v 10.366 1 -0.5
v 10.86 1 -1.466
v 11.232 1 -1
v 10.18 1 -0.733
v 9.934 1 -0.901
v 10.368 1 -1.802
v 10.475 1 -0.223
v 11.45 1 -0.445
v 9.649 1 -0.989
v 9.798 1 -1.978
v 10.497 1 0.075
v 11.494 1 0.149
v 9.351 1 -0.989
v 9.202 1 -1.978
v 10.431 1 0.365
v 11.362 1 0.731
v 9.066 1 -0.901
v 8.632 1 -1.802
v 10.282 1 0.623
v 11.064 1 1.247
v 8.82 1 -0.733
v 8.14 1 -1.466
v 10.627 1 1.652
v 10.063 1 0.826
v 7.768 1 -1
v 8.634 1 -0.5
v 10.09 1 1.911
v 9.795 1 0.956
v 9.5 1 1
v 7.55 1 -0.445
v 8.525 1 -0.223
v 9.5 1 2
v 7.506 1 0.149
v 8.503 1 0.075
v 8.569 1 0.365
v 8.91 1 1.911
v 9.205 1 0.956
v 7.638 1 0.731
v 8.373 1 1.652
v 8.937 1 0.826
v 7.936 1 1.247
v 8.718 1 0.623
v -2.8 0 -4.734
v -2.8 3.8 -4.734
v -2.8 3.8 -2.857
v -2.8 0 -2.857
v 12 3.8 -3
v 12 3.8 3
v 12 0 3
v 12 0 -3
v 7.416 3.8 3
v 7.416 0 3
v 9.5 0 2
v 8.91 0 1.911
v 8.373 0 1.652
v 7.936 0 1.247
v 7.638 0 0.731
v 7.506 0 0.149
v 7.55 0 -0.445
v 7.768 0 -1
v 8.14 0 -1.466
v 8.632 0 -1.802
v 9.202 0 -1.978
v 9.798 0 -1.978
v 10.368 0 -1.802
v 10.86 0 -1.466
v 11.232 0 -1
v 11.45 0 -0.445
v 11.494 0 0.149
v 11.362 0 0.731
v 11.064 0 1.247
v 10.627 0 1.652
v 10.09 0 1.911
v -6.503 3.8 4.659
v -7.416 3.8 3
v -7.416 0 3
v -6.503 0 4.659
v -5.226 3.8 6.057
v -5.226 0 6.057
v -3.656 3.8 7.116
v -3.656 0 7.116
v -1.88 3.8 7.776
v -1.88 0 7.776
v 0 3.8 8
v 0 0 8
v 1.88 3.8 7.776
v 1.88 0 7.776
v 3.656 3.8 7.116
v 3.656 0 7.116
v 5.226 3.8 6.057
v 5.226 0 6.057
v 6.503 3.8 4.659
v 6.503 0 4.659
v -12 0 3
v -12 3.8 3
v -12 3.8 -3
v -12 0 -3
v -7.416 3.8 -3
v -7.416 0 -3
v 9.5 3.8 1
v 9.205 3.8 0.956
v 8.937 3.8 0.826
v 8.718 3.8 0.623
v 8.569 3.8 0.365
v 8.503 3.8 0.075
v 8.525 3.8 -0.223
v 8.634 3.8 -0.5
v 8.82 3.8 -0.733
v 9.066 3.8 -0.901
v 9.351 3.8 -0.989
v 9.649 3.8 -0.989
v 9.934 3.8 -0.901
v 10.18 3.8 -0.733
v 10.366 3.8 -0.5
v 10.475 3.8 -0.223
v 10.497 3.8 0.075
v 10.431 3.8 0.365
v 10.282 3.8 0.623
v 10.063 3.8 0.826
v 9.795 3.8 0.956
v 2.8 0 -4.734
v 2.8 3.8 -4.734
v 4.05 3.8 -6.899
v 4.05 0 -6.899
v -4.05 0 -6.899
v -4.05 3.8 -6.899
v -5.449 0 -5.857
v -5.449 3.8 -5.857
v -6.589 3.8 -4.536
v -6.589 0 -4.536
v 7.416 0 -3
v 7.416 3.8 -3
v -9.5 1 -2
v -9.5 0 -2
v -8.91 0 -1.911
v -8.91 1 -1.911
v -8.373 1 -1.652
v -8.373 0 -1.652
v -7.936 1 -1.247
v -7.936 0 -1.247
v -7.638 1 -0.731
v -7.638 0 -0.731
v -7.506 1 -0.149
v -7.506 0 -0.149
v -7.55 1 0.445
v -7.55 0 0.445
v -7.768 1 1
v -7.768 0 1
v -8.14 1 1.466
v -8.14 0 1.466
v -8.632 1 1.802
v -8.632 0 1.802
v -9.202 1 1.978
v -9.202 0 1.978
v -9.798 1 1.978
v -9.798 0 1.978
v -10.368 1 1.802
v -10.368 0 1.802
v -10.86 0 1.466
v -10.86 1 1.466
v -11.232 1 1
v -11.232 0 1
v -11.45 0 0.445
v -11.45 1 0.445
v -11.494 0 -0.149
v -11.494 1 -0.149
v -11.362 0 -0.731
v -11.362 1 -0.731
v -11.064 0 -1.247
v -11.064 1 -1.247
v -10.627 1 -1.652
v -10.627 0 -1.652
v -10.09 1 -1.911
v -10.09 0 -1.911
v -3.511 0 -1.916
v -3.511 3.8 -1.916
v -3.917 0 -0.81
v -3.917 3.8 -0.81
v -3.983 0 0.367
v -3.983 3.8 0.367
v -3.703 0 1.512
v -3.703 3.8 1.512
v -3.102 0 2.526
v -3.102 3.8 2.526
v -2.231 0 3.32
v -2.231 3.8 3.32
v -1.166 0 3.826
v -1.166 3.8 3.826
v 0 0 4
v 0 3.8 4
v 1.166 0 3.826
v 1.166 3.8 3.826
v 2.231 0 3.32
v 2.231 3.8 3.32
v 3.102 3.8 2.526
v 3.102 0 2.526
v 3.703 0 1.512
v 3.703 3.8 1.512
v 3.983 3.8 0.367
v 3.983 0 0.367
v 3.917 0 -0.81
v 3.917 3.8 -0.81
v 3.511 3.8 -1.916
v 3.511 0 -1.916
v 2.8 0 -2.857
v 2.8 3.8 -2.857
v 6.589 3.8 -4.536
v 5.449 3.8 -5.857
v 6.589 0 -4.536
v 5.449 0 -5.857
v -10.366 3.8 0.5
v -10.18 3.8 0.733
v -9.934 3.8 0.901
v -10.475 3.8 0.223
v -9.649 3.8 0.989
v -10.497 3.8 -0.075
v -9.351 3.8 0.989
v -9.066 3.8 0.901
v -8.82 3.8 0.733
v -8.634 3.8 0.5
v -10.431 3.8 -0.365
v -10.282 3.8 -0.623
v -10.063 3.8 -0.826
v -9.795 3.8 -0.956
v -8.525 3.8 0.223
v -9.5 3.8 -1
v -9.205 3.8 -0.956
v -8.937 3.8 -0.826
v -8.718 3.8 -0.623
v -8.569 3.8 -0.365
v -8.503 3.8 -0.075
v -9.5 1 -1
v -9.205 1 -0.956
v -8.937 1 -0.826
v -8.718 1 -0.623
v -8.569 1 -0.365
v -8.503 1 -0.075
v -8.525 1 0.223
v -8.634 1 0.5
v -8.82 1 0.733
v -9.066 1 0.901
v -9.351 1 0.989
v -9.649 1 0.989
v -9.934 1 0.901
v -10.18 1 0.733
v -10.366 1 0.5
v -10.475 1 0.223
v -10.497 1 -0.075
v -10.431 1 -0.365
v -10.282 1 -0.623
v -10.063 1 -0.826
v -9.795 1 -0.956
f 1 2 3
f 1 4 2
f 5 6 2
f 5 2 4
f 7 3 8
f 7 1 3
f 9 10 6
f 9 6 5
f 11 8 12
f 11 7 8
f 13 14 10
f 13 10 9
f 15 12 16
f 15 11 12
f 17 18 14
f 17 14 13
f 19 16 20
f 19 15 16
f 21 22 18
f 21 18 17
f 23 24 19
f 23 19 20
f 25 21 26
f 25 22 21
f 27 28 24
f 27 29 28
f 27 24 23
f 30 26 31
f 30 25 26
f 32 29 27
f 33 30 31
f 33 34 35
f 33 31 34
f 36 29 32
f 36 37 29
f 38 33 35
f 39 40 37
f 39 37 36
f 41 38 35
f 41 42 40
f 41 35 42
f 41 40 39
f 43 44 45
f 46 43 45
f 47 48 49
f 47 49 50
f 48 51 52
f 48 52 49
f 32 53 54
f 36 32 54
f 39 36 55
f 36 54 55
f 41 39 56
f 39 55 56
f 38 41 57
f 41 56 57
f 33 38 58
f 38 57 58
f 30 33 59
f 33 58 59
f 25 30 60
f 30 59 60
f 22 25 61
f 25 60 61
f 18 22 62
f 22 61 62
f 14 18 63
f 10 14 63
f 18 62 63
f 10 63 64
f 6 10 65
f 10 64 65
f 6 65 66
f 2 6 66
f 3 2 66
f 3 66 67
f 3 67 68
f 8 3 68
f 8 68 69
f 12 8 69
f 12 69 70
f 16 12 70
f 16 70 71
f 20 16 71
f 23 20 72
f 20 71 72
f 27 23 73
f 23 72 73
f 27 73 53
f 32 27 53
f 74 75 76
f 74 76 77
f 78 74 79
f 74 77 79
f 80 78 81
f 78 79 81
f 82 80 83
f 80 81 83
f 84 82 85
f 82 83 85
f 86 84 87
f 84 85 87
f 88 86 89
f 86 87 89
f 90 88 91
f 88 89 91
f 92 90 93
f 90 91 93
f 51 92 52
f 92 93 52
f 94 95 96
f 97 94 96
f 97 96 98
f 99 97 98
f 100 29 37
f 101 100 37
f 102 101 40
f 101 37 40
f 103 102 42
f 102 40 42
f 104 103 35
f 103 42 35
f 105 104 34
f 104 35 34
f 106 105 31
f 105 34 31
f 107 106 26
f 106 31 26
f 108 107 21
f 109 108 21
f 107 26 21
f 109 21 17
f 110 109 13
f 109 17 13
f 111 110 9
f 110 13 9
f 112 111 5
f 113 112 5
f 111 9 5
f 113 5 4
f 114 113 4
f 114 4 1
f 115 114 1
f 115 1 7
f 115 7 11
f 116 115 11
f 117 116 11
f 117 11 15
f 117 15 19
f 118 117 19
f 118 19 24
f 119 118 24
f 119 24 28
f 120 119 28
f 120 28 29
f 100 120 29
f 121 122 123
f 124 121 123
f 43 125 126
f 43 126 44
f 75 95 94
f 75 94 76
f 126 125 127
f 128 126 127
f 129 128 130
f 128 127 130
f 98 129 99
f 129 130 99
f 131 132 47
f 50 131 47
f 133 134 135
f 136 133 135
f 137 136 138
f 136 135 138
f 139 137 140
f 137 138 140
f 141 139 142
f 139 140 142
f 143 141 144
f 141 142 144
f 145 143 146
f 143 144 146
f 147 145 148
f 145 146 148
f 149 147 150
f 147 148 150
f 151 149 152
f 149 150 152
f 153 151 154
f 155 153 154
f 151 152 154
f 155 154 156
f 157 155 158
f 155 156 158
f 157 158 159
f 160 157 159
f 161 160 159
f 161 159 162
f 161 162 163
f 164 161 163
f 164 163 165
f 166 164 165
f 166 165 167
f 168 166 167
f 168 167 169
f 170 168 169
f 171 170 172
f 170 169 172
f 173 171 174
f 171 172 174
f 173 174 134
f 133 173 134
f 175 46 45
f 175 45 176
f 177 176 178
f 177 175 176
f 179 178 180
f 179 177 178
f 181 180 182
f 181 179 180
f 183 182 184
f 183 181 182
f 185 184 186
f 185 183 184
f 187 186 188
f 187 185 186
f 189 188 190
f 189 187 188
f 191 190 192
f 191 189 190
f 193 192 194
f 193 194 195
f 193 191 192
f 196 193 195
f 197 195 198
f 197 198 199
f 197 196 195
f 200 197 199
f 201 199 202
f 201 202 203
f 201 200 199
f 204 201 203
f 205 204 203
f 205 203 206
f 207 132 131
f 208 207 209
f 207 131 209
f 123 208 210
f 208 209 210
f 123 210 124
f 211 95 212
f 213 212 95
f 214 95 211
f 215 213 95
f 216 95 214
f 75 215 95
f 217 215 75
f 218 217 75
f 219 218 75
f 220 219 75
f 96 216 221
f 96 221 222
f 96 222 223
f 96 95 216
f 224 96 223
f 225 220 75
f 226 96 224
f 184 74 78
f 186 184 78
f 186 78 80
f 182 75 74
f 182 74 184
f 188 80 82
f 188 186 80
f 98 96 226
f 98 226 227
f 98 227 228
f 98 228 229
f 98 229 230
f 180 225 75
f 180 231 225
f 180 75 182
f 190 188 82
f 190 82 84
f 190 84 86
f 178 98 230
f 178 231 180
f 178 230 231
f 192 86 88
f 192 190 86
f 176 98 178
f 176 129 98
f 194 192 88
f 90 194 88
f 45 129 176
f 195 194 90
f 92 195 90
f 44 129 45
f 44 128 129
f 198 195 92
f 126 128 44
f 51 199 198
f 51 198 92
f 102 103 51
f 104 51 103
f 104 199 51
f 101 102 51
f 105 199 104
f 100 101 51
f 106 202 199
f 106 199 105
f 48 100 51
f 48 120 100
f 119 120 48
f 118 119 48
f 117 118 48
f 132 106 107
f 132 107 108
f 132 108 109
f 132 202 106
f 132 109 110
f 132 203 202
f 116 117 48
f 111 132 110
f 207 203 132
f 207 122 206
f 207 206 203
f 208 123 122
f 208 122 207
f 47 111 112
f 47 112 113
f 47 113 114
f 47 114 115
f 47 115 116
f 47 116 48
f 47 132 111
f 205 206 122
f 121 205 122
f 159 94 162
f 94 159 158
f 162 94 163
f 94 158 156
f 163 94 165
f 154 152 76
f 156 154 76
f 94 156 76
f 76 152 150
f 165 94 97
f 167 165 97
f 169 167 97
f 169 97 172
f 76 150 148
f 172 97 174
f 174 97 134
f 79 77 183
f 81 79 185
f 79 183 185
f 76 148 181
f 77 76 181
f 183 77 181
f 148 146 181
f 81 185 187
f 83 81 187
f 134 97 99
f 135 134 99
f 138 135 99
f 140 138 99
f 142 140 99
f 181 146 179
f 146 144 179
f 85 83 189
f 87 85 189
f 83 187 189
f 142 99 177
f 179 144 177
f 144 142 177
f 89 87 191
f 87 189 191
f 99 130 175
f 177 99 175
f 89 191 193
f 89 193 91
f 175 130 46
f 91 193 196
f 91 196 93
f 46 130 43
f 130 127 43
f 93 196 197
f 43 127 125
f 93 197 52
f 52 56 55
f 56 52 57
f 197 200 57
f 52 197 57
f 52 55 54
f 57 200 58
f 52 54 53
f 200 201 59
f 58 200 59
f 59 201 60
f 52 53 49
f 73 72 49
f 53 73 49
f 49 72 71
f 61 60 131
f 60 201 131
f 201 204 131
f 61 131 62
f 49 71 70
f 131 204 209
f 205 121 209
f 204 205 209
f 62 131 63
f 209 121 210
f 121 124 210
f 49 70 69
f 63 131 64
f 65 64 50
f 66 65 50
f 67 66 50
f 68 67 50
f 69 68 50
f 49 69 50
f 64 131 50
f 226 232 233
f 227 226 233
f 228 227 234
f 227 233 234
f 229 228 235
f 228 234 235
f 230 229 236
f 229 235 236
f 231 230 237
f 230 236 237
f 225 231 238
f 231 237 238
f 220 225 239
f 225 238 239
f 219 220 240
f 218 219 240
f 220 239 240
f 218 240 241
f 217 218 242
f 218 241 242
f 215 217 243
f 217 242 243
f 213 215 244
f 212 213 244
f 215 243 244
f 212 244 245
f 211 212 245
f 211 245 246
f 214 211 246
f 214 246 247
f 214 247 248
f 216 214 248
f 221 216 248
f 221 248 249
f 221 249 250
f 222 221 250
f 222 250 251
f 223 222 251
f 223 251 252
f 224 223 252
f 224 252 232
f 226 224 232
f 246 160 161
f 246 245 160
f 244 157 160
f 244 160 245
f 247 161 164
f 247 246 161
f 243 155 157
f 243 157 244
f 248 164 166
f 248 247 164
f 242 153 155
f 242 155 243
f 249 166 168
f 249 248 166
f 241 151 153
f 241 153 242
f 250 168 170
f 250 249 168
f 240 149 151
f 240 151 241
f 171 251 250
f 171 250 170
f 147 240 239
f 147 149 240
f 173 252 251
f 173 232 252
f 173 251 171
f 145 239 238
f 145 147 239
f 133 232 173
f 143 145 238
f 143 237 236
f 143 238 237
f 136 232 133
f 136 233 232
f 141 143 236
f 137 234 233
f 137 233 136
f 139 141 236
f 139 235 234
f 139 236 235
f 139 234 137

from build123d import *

# Parameters (mm, degrees)
SKETCH_1_R          = 8
SKETCH_1_R_2        = 4
EXTRUDE_1_DEPTH     = 3.8
SKETCH_4_W          = 6
SKETCH_4_H          = 6
EXTRUDE_2_DEPTH     = 3.8
SKETCH_5_R          = 2
CUT_EXTRUDE_3_DEPTH = 1
SKETCH_6_R          = 1
CUT_EXTRUDE_4_DEPTH = 15.691494138
CUT_EXTRUDE_5_DEPTH = 15.91442255


with BuildPart() as part:
    # 草图1 → 凸台-拉伸1 (new body)
    with BuildSketch(Plane(origin=(0, 0, 0), x_dir=(1, 0, 0), z_dir=(0, 1, 0))):
        with Locations(Location((0, 0, 0), (0, 0, 90))):
            Circle(SKETCH_1_R)
        with Locations(Location((0, 0, 0), (0, 0, 90))):
            Circle(SKETCH_1_R_2, mode=Mode.SUBTRACT)
    extrude(amount=EXTRUDE_1_DEPTH)

    # 草图4 → 凸台-拉伸2 (add)
    with BuildSketch(Plane(origin=(0, 3.8, 0), x_dir=(1, 0, 0), z_dir=(0, 1, 0))):
        with Locations((-9, 0)):
            Rectangle(SKETCH_4_W, SKETCH_4_H)
        with Locations((9, 0)):
            Rectangle(SKETCH_4_W, SKETCH_4_H)
    extrude(amount=-EXTRUDE_2_DEPTH)

    # 草图5 → 切除-拉伸3 (cut)
    with BuildSketch(Plane.XZ):
        with Locations(Location((-9.5, 0, 0), (0, 0, 270))):
            Circle(SKETCH_5_R)
        with Locations(Location((9.5, 0, 0), (0, 0, 90))):
            Circle(SKETCH_5_R)
    extrude(amount=-CUT_EXTRUDE_3_DEPTH, mode=Mode.SUBTRACT)

    # 草图6 → 切除-拉伸4 (cut, through all)
    with BuildSketch(Plane.XZ.offset(-1)):
        with Locations(Location((-9.5, 0, 0), (0, 0, 270))):
            Circle(SKETCH_6_R)
        with Locations(Location((9.5, 0, 0), (0, 0, 90))):
            Circle(SKETCH_6_R)
    extrude(amount=-CUT_EXTRUDE_4_DEPTH, mode=Mode.SUBTRACT)

    # 草图7 → 切除-拉伸5 (cut, through all)
    with BuildSketch(Plane(origin=(0, 3.8, 0), x_dir=(1, 0, 0), z_dir=(0, 1, 0))):
        with BuildLine():
            Line((-4.05, 6.899094143), (-2.8, 4.734030634))
            Line((-2.8, 4.734030634), (-2.8, 2.856571371))
            ThreePointArc((-2.8, 2.856571371), (0, 4), (2.8, 2.856571371))
            Line((2.8, 2.856571371), (2.8, 4.734030634))
            Line((2.8, 4.734030634), (4.05, 6.899094143))
            ThreePointArc((4.05, 6.899094143), (0, 8), (-4.05, 6.899094143))
        make_face()
    extrude(amount=-CUT_EXTRUDE_5_DEPTH, mode=Mode.SUBTRACT)


solid = part.part
